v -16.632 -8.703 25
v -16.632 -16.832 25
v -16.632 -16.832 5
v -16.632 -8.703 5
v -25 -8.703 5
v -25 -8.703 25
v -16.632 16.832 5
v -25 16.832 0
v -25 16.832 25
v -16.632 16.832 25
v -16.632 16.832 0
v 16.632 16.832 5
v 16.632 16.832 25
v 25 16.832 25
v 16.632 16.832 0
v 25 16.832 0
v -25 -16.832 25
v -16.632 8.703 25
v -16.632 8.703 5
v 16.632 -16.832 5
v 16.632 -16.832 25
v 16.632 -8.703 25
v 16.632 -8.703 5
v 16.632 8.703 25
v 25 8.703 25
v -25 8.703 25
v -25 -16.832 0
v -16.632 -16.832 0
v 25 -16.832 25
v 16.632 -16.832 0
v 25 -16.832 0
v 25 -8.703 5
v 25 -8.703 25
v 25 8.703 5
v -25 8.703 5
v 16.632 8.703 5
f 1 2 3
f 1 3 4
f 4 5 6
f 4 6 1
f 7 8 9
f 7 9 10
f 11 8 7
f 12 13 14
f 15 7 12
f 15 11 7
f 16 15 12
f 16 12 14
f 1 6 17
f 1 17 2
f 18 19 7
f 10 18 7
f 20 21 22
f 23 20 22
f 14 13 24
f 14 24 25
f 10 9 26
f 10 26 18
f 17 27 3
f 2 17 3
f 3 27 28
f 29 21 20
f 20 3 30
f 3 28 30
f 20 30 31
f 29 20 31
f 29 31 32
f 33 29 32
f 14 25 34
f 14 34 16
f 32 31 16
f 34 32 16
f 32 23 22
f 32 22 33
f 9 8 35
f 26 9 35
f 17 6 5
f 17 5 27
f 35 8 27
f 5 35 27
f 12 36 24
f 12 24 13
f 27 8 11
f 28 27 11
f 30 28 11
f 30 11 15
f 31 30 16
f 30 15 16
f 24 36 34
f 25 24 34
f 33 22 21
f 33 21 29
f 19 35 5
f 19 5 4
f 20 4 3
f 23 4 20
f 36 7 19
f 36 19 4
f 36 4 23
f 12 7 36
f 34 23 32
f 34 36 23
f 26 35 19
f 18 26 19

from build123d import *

# Parameters (mm, degrees)
F0_W     = 8.368255198
F0_H     = 8.1290510939
F1_DEPTH = 5
F2_DEPTH = 25


with BuildPart() as f1:
    # F0 (on Top) → F1 (new body)
    with BuildSketch(Plane.XY):
        with Locations((-20.815872401, 12.7671566554)):
            Rectangle(F0_W, F0_H)
        Polygon((16.631744802, 16.8316822024), (-16.631744802, 16.8316822024), (-16.631744802, 8.7026311085), (-25, 8.7026311085), (-25, -8.7026311085), (-16.631744802, -8.7026311085), (-16.631744802, -16.8316822024), (16.631744802, -16.8316822024), (16.631744802, -8.7026311085), (25, -8.7026311085), (25, 8.7026311085), (16.631744802, 8.7026311085), align=None)
        with Locations((20.815872401, 12.7671566554)):
            Rectangle(F0_W, F0_H)
        with Locations((-20.815872401, -12.7671566554)):
            Rectangle(F0_W, F0_H)
        with Locations((20.815872401, -12.7671566554)):
            Rectangle(F0_W, F0_H)
    extrude(amount=F1_DEPTH)

    # F0 (on Top) → F2 (join)
    with BuildSketch(Plane.XY):
        with Locations((20.815872401, 12.7671566554)):
            Rectangle(F0_W, F0_H)
        with Locations((20.815872401, -12.7671566554)):
            Rectangle(F0_W, F0_H)
        with Locations((-20.815872401, -12.7671566554)):
            Rectangle(F0_W, F0_H)
        with Locations((-20.815872401, 12.7671566554)):
            Rectangle(F0_W, F0_H)
    extrude(amount=F2_DEPTH)


solid = f1.part
